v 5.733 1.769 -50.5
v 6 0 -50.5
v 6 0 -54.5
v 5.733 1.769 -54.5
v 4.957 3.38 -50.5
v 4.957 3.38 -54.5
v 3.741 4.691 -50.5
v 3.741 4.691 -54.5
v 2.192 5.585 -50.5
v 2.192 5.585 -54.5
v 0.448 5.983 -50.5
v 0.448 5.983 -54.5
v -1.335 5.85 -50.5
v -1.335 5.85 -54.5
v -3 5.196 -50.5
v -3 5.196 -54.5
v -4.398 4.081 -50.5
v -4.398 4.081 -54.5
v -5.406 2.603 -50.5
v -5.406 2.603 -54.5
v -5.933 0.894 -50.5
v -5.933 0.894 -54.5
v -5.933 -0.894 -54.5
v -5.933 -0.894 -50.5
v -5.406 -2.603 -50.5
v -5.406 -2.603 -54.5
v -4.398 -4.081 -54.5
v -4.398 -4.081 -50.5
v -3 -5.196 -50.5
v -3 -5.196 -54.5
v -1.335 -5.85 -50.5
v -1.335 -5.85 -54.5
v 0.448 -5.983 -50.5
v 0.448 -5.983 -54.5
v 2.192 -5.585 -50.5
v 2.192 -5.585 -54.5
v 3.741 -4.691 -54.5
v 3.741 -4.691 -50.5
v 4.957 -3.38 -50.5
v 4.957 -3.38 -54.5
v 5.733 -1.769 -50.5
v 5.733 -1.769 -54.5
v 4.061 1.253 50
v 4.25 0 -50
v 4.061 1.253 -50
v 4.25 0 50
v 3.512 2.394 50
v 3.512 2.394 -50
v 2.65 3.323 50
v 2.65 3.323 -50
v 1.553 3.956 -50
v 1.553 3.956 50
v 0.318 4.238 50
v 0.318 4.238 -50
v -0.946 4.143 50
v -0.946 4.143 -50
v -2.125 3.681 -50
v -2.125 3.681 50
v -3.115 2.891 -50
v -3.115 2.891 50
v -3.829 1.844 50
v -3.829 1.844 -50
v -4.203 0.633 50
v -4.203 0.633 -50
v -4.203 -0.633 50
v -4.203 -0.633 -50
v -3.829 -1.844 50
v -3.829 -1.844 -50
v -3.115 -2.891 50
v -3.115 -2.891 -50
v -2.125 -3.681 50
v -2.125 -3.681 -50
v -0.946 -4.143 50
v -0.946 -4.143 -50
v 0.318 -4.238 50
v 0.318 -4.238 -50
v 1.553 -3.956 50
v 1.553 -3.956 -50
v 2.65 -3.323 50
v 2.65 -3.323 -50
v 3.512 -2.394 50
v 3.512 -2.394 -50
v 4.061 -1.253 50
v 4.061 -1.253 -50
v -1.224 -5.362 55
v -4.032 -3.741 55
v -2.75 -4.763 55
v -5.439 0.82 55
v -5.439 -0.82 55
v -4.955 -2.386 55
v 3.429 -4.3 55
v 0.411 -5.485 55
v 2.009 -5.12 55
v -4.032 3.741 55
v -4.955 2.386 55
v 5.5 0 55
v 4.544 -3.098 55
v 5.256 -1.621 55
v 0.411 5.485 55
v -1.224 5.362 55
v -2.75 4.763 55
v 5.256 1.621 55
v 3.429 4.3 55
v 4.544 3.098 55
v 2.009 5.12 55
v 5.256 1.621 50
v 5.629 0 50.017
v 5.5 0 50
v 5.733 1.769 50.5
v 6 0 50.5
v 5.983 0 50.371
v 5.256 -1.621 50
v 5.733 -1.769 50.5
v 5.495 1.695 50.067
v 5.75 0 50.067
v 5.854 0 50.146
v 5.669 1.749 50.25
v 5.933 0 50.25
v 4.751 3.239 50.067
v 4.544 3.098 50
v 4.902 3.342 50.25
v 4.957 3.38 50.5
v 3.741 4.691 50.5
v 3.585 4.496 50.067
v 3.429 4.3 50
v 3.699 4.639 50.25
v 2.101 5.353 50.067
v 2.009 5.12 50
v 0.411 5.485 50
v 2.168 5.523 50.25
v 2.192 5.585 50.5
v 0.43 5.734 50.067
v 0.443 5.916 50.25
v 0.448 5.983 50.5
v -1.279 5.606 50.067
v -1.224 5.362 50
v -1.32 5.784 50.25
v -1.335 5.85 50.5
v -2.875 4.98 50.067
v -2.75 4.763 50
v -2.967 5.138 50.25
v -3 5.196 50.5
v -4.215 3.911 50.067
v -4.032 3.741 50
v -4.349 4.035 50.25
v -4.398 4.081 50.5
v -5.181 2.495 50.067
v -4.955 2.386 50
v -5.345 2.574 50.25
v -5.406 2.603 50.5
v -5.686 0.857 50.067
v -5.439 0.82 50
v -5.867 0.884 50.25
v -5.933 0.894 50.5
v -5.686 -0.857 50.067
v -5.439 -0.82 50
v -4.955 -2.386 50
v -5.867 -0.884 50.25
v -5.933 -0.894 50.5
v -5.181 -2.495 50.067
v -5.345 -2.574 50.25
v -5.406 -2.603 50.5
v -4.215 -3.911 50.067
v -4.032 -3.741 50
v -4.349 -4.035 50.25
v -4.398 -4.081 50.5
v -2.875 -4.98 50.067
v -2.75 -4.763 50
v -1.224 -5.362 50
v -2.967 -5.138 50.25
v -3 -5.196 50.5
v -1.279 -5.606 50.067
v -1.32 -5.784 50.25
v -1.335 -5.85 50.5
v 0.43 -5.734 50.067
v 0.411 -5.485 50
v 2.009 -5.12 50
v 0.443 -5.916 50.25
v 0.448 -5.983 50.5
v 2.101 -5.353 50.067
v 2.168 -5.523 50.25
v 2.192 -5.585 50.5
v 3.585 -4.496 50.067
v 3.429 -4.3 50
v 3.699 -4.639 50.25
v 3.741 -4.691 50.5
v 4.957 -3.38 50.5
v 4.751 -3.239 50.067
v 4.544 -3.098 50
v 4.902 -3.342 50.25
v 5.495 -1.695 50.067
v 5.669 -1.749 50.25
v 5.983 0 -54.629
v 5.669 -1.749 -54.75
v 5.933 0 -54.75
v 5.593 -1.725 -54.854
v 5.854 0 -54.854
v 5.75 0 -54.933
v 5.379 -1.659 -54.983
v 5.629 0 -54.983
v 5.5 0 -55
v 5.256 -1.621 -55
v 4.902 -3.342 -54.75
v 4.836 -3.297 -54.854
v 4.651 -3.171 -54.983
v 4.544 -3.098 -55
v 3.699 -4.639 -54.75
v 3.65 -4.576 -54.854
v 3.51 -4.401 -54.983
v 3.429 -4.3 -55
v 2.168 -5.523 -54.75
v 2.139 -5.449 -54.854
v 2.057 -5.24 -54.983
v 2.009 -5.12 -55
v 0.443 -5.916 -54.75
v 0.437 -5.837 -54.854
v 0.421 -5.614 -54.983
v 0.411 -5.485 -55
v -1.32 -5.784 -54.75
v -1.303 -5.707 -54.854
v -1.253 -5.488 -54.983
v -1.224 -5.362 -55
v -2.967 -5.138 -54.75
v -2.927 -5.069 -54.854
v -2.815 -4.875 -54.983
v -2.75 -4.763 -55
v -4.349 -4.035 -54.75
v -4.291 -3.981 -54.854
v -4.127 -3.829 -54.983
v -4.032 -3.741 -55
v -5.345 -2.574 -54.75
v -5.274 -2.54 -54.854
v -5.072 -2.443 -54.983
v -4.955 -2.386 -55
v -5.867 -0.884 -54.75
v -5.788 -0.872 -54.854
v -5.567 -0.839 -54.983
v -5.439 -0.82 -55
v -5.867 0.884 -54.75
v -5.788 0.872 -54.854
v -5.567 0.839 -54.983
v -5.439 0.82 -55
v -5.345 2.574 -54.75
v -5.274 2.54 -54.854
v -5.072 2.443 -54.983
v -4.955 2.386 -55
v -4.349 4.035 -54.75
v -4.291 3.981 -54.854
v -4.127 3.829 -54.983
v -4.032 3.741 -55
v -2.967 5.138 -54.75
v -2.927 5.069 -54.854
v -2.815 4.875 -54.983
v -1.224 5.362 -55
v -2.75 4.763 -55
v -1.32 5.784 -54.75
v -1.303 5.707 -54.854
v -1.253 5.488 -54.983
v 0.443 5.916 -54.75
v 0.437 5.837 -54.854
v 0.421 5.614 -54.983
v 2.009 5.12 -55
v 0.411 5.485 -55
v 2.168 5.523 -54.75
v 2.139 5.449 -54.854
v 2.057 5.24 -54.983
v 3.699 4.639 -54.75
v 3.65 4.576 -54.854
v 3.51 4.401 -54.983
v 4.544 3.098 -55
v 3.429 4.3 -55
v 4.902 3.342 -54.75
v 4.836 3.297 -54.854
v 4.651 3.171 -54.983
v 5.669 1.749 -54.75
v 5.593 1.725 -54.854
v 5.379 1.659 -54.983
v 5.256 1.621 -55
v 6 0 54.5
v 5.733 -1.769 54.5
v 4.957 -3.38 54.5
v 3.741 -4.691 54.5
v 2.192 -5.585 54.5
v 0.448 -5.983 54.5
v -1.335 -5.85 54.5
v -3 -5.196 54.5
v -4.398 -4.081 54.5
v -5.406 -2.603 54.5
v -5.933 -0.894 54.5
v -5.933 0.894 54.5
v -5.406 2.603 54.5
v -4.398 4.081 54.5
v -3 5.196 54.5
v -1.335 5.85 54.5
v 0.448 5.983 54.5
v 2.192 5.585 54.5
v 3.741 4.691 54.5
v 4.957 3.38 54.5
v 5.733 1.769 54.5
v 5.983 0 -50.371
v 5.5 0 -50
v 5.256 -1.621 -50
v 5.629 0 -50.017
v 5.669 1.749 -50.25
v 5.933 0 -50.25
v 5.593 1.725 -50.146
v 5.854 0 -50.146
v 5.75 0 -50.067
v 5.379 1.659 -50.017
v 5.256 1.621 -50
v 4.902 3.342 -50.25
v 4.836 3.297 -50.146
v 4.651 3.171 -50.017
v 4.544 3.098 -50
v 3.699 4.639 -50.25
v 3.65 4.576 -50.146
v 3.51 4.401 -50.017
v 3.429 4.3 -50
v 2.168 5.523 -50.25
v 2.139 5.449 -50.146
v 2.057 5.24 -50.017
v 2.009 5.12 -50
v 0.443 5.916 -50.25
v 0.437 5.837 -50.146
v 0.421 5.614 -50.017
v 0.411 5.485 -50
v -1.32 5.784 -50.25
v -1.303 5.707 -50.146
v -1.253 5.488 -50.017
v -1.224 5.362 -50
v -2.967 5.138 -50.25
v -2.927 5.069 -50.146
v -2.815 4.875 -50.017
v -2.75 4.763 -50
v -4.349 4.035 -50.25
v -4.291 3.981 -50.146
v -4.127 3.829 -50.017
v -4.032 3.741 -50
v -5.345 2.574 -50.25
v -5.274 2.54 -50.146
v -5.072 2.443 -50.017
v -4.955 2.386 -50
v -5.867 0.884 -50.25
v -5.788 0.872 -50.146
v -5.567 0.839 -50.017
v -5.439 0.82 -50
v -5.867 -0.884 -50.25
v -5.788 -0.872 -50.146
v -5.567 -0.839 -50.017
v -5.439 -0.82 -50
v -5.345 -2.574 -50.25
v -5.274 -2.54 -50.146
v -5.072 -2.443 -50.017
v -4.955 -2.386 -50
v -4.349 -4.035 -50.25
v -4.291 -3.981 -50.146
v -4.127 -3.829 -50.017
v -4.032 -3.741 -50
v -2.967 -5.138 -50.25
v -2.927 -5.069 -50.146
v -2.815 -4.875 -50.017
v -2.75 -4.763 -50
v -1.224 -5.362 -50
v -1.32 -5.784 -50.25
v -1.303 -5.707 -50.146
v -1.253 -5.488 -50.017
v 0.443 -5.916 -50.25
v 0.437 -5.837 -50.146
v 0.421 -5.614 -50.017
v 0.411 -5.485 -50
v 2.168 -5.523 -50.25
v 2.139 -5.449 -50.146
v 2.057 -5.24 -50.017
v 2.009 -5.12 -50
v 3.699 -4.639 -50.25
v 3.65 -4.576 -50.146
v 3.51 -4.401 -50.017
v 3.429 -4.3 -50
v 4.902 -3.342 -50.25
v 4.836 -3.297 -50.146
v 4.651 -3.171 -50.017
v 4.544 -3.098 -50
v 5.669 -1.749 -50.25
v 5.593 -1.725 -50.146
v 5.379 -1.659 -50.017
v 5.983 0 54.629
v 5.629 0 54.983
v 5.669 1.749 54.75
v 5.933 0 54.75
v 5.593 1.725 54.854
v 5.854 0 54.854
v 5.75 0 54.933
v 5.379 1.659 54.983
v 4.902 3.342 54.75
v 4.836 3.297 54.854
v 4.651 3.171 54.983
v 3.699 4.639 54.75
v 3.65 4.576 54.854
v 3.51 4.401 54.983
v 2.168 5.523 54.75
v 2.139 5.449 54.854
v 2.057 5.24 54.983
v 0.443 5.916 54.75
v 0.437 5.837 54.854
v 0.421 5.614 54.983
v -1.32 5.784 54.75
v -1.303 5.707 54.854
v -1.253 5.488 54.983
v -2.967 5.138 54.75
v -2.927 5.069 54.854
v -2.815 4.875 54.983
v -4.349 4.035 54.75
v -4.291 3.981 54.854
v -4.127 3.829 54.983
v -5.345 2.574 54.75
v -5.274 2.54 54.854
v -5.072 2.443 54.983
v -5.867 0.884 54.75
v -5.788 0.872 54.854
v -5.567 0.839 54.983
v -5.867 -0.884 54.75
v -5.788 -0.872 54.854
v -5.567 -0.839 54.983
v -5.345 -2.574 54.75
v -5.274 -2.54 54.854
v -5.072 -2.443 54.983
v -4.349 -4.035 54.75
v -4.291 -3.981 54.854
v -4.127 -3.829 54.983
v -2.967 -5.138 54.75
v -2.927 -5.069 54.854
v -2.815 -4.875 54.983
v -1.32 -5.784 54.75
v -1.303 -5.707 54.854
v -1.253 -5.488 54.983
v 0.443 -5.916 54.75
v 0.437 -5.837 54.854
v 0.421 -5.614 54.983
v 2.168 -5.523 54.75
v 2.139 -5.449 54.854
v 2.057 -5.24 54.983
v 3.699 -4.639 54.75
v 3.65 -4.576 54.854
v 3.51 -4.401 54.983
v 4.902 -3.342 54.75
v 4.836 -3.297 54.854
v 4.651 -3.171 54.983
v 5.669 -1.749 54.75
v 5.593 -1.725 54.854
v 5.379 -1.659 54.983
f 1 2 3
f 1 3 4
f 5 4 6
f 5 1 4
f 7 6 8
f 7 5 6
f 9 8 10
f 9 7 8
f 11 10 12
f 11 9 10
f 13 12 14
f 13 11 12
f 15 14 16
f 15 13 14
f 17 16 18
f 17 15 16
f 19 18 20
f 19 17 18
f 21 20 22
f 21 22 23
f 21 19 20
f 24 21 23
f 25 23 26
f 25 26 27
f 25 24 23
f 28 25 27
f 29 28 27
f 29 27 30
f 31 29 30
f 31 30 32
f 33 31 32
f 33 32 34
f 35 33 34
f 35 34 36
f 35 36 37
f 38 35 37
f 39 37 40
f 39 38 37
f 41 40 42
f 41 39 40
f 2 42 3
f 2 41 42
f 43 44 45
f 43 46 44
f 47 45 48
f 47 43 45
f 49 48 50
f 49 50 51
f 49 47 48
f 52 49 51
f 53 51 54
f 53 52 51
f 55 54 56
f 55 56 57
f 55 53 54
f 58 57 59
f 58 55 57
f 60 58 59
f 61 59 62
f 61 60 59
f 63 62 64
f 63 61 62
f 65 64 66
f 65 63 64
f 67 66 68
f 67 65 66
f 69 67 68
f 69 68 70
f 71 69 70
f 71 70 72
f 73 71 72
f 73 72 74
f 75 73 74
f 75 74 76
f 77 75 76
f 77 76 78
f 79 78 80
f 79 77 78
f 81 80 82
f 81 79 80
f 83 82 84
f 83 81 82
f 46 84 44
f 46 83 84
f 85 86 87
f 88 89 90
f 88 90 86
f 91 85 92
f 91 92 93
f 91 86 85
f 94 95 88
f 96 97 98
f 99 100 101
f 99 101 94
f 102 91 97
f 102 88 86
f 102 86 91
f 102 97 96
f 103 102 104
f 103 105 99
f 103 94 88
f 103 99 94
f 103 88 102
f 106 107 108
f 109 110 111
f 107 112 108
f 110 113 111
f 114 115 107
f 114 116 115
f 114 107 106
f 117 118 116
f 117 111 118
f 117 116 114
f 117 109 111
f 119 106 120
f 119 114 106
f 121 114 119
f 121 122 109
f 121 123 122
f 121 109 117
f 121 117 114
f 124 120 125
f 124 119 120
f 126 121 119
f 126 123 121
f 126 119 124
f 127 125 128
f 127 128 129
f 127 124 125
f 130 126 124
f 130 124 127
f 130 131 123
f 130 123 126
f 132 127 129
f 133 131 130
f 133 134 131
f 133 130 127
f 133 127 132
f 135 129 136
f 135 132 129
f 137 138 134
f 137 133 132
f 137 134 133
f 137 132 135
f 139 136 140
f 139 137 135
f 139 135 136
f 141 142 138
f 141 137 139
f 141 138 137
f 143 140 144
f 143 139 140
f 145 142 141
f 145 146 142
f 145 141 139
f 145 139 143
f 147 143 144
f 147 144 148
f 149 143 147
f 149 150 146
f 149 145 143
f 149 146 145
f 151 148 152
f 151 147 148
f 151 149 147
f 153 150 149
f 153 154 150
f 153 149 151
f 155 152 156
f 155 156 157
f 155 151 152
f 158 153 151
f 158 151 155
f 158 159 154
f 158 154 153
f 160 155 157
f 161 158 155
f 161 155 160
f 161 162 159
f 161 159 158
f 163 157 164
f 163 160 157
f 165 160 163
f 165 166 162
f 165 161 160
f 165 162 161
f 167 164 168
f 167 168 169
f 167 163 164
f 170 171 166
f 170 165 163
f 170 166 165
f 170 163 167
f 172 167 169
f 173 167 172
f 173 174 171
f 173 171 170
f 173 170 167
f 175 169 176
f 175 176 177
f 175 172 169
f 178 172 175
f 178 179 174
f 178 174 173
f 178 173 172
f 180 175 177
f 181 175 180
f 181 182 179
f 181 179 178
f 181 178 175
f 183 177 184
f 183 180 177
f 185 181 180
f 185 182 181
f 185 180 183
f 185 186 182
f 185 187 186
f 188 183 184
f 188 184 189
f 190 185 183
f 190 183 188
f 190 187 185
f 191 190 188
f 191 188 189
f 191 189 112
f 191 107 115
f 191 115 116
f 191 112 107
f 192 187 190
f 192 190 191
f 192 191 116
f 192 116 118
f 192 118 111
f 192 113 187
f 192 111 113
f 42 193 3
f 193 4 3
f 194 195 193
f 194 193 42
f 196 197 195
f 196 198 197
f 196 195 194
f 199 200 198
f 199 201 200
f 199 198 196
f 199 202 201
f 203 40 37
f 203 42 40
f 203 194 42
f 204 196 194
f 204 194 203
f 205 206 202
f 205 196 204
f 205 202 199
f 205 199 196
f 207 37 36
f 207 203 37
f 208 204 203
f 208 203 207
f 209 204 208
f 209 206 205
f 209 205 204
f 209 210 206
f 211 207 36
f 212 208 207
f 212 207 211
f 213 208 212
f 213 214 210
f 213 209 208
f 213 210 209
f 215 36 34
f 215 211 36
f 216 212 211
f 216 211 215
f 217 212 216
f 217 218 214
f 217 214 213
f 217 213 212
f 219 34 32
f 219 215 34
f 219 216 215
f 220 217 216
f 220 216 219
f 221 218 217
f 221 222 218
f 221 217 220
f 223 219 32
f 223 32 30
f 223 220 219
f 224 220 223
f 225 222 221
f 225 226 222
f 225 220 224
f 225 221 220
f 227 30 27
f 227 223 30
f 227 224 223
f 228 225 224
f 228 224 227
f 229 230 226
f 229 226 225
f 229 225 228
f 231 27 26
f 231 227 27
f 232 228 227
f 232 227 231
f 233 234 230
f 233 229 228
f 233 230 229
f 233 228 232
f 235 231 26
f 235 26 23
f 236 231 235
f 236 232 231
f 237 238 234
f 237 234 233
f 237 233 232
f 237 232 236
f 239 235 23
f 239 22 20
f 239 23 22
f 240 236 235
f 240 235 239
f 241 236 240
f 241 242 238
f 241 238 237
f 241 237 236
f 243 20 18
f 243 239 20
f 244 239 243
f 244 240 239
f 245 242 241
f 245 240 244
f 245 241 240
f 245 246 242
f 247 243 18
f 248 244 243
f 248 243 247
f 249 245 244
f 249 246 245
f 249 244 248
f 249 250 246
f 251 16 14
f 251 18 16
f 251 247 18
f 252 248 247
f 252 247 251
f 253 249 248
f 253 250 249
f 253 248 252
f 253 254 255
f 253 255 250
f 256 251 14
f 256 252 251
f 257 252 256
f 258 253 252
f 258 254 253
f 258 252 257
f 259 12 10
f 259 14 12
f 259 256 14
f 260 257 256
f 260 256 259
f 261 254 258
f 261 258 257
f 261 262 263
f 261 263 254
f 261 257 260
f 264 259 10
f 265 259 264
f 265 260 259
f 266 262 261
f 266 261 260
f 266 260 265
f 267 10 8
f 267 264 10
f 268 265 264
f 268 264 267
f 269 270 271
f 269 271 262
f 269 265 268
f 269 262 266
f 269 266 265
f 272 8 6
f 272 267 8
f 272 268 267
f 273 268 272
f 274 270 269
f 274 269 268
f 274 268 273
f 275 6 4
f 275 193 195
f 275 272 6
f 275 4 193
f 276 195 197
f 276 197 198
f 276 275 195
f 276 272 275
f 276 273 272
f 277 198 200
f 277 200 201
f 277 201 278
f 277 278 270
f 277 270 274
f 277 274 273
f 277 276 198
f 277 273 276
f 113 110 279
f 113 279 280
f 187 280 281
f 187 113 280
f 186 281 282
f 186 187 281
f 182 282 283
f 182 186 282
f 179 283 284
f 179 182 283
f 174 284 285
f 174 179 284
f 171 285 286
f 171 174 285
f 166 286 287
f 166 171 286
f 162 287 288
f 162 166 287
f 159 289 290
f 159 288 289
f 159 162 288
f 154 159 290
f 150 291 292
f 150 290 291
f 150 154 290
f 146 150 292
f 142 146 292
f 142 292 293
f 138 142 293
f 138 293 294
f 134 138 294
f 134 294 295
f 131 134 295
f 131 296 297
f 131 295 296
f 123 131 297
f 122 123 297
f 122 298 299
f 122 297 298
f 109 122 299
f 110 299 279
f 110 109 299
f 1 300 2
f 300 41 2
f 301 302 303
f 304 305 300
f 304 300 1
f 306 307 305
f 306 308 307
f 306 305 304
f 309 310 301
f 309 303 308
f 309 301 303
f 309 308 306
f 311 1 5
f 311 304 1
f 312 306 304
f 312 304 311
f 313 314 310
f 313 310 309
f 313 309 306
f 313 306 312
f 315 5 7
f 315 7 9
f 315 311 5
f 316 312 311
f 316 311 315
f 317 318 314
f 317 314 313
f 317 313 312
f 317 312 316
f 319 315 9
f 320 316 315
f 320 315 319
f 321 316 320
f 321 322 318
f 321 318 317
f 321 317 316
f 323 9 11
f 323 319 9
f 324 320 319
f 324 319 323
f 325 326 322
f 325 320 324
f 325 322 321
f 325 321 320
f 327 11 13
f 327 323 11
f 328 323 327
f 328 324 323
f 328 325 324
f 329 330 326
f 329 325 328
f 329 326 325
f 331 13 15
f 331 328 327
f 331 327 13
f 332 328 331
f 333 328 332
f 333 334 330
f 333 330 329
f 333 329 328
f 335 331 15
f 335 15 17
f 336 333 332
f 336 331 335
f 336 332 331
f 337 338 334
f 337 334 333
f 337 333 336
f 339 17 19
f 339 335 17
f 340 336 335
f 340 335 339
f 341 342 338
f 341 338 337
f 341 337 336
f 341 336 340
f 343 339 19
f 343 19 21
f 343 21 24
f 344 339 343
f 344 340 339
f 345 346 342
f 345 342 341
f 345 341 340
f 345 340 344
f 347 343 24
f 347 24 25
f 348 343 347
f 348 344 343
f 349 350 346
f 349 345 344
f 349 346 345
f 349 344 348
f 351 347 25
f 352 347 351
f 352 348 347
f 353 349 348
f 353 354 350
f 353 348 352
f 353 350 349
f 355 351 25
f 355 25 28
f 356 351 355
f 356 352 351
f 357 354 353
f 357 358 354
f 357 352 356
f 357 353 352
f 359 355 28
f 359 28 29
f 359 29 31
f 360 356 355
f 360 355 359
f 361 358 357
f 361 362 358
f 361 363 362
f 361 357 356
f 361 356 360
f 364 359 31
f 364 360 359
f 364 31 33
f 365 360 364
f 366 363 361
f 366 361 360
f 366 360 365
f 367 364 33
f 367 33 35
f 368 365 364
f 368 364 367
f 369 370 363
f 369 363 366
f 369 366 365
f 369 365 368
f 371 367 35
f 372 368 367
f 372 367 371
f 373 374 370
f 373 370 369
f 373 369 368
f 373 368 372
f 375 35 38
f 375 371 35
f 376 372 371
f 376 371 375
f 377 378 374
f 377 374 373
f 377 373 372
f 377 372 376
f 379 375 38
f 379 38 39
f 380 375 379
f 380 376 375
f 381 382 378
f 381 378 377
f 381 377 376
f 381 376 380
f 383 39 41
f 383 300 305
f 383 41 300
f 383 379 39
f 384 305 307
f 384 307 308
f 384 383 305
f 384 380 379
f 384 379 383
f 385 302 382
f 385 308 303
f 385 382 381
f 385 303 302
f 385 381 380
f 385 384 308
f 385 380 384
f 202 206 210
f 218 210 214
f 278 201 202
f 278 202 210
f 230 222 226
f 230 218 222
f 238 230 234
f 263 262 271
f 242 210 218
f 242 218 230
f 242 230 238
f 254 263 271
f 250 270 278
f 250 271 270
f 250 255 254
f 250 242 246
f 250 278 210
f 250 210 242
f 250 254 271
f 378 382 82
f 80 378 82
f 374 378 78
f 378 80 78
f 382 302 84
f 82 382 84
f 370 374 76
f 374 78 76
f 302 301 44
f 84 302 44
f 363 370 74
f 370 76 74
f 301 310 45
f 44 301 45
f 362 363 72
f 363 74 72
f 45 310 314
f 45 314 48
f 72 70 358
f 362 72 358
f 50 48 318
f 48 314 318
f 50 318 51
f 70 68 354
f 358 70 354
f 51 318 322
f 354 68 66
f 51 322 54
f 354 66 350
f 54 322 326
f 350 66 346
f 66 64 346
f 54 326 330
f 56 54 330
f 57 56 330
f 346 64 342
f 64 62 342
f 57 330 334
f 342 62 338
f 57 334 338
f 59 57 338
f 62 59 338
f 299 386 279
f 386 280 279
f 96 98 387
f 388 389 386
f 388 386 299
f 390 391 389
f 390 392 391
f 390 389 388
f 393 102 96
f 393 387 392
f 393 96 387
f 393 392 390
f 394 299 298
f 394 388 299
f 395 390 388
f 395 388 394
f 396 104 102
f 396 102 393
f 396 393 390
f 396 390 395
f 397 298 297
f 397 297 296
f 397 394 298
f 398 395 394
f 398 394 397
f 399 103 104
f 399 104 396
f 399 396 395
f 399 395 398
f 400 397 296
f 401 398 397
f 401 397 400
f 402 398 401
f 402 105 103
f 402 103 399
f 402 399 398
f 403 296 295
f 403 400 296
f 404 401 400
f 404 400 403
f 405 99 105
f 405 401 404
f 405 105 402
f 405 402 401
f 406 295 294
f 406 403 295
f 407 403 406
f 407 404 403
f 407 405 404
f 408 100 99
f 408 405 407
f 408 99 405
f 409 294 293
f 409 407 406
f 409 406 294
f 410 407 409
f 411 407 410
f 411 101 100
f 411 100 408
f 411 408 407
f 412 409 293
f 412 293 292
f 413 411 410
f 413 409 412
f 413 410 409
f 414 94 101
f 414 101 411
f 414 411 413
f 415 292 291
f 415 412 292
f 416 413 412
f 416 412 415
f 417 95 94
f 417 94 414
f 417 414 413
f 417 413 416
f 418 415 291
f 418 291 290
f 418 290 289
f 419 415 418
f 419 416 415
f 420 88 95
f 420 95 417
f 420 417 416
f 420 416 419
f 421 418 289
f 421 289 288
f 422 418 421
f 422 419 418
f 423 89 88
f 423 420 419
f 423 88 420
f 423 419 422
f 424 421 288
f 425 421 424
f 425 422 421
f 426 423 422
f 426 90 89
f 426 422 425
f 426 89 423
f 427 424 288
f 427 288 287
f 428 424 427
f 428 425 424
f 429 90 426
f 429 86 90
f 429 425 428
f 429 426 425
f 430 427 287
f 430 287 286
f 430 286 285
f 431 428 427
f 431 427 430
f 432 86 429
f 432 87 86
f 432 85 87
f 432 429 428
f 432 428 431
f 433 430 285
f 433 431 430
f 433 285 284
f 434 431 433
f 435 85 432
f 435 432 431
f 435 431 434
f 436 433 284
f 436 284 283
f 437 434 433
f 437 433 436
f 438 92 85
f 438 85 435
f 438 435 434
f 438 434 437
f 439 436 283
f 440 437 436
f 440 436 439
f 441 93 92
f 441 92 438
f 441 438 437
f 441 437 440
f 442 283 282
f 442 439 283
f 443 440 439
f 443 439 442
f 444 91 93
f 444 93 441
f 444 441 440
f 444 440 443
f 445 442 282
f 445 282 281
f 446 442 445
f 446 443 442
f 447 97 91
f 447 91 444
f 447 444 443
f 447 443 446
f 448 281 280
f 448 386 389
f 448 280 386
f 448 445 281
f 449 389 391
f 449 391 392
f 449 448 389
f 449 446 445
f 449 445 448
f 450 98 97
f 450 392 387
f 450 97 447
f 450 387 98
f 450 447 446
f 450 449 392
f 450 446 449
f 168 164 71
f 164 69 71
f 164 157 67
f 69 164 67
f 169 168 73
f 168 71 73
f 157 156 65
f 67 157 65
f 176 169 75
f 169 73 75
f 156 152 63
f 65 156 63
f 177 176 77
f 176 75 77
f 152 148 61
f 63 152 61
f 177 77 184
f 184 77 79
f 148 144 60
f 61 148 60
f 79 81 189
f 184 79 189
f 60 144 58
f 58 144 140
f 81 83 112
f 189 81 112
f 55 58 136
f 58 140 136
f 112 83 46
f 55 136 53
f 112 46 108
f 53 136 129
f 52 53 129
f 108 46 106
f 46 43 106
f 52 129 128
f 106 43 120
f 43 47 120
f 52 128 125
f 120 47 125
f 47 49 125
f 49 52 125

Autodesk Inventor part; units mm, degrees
ref_plane "YZ Plane" through (0, 0, 0) normal (1, 0, 0) x (0, 1, 0)
ref_plane "XZ Plane" through (0, 0, 0) normal (0, 1, 0) x (-1, 0, 0)
ref_plane "XY Plane" through (0, 0, 0) normal (0, 0, 1) x (1, 0, 0)
sketch "Sketch1" plane through (0, 0, 0) normal (0, 0, 1) x (1, 0, 0)
  circle A0 centre (0, 0) radius 4.25
  dimension "d0" = 8.5
extrude "Extrusion1" add sketch "Sketch1" along normal mid plane 100
sketch "Sketch2" plane through (0, 0, 50) normal (0, 0, 1) x (1, 0, 0)
  circle A0 centre (0, 0) radius 6
  dimension "d3" = 12
extrude "Extrusion2" add sketch "Sketch2" along normal blind 5
mirror "Mirror1" about plane through (0, 0, 0) normal (0, 0, 1) of "Extrusion2"
fillet "Fillet1" radius 0.5 4 edges at (-6, 0, -55) (-6, 0, -50) (-6, 0, 55) (-6, 0, 50)
properties part number "Connecting rod hinge" material "Stainless Steel"
